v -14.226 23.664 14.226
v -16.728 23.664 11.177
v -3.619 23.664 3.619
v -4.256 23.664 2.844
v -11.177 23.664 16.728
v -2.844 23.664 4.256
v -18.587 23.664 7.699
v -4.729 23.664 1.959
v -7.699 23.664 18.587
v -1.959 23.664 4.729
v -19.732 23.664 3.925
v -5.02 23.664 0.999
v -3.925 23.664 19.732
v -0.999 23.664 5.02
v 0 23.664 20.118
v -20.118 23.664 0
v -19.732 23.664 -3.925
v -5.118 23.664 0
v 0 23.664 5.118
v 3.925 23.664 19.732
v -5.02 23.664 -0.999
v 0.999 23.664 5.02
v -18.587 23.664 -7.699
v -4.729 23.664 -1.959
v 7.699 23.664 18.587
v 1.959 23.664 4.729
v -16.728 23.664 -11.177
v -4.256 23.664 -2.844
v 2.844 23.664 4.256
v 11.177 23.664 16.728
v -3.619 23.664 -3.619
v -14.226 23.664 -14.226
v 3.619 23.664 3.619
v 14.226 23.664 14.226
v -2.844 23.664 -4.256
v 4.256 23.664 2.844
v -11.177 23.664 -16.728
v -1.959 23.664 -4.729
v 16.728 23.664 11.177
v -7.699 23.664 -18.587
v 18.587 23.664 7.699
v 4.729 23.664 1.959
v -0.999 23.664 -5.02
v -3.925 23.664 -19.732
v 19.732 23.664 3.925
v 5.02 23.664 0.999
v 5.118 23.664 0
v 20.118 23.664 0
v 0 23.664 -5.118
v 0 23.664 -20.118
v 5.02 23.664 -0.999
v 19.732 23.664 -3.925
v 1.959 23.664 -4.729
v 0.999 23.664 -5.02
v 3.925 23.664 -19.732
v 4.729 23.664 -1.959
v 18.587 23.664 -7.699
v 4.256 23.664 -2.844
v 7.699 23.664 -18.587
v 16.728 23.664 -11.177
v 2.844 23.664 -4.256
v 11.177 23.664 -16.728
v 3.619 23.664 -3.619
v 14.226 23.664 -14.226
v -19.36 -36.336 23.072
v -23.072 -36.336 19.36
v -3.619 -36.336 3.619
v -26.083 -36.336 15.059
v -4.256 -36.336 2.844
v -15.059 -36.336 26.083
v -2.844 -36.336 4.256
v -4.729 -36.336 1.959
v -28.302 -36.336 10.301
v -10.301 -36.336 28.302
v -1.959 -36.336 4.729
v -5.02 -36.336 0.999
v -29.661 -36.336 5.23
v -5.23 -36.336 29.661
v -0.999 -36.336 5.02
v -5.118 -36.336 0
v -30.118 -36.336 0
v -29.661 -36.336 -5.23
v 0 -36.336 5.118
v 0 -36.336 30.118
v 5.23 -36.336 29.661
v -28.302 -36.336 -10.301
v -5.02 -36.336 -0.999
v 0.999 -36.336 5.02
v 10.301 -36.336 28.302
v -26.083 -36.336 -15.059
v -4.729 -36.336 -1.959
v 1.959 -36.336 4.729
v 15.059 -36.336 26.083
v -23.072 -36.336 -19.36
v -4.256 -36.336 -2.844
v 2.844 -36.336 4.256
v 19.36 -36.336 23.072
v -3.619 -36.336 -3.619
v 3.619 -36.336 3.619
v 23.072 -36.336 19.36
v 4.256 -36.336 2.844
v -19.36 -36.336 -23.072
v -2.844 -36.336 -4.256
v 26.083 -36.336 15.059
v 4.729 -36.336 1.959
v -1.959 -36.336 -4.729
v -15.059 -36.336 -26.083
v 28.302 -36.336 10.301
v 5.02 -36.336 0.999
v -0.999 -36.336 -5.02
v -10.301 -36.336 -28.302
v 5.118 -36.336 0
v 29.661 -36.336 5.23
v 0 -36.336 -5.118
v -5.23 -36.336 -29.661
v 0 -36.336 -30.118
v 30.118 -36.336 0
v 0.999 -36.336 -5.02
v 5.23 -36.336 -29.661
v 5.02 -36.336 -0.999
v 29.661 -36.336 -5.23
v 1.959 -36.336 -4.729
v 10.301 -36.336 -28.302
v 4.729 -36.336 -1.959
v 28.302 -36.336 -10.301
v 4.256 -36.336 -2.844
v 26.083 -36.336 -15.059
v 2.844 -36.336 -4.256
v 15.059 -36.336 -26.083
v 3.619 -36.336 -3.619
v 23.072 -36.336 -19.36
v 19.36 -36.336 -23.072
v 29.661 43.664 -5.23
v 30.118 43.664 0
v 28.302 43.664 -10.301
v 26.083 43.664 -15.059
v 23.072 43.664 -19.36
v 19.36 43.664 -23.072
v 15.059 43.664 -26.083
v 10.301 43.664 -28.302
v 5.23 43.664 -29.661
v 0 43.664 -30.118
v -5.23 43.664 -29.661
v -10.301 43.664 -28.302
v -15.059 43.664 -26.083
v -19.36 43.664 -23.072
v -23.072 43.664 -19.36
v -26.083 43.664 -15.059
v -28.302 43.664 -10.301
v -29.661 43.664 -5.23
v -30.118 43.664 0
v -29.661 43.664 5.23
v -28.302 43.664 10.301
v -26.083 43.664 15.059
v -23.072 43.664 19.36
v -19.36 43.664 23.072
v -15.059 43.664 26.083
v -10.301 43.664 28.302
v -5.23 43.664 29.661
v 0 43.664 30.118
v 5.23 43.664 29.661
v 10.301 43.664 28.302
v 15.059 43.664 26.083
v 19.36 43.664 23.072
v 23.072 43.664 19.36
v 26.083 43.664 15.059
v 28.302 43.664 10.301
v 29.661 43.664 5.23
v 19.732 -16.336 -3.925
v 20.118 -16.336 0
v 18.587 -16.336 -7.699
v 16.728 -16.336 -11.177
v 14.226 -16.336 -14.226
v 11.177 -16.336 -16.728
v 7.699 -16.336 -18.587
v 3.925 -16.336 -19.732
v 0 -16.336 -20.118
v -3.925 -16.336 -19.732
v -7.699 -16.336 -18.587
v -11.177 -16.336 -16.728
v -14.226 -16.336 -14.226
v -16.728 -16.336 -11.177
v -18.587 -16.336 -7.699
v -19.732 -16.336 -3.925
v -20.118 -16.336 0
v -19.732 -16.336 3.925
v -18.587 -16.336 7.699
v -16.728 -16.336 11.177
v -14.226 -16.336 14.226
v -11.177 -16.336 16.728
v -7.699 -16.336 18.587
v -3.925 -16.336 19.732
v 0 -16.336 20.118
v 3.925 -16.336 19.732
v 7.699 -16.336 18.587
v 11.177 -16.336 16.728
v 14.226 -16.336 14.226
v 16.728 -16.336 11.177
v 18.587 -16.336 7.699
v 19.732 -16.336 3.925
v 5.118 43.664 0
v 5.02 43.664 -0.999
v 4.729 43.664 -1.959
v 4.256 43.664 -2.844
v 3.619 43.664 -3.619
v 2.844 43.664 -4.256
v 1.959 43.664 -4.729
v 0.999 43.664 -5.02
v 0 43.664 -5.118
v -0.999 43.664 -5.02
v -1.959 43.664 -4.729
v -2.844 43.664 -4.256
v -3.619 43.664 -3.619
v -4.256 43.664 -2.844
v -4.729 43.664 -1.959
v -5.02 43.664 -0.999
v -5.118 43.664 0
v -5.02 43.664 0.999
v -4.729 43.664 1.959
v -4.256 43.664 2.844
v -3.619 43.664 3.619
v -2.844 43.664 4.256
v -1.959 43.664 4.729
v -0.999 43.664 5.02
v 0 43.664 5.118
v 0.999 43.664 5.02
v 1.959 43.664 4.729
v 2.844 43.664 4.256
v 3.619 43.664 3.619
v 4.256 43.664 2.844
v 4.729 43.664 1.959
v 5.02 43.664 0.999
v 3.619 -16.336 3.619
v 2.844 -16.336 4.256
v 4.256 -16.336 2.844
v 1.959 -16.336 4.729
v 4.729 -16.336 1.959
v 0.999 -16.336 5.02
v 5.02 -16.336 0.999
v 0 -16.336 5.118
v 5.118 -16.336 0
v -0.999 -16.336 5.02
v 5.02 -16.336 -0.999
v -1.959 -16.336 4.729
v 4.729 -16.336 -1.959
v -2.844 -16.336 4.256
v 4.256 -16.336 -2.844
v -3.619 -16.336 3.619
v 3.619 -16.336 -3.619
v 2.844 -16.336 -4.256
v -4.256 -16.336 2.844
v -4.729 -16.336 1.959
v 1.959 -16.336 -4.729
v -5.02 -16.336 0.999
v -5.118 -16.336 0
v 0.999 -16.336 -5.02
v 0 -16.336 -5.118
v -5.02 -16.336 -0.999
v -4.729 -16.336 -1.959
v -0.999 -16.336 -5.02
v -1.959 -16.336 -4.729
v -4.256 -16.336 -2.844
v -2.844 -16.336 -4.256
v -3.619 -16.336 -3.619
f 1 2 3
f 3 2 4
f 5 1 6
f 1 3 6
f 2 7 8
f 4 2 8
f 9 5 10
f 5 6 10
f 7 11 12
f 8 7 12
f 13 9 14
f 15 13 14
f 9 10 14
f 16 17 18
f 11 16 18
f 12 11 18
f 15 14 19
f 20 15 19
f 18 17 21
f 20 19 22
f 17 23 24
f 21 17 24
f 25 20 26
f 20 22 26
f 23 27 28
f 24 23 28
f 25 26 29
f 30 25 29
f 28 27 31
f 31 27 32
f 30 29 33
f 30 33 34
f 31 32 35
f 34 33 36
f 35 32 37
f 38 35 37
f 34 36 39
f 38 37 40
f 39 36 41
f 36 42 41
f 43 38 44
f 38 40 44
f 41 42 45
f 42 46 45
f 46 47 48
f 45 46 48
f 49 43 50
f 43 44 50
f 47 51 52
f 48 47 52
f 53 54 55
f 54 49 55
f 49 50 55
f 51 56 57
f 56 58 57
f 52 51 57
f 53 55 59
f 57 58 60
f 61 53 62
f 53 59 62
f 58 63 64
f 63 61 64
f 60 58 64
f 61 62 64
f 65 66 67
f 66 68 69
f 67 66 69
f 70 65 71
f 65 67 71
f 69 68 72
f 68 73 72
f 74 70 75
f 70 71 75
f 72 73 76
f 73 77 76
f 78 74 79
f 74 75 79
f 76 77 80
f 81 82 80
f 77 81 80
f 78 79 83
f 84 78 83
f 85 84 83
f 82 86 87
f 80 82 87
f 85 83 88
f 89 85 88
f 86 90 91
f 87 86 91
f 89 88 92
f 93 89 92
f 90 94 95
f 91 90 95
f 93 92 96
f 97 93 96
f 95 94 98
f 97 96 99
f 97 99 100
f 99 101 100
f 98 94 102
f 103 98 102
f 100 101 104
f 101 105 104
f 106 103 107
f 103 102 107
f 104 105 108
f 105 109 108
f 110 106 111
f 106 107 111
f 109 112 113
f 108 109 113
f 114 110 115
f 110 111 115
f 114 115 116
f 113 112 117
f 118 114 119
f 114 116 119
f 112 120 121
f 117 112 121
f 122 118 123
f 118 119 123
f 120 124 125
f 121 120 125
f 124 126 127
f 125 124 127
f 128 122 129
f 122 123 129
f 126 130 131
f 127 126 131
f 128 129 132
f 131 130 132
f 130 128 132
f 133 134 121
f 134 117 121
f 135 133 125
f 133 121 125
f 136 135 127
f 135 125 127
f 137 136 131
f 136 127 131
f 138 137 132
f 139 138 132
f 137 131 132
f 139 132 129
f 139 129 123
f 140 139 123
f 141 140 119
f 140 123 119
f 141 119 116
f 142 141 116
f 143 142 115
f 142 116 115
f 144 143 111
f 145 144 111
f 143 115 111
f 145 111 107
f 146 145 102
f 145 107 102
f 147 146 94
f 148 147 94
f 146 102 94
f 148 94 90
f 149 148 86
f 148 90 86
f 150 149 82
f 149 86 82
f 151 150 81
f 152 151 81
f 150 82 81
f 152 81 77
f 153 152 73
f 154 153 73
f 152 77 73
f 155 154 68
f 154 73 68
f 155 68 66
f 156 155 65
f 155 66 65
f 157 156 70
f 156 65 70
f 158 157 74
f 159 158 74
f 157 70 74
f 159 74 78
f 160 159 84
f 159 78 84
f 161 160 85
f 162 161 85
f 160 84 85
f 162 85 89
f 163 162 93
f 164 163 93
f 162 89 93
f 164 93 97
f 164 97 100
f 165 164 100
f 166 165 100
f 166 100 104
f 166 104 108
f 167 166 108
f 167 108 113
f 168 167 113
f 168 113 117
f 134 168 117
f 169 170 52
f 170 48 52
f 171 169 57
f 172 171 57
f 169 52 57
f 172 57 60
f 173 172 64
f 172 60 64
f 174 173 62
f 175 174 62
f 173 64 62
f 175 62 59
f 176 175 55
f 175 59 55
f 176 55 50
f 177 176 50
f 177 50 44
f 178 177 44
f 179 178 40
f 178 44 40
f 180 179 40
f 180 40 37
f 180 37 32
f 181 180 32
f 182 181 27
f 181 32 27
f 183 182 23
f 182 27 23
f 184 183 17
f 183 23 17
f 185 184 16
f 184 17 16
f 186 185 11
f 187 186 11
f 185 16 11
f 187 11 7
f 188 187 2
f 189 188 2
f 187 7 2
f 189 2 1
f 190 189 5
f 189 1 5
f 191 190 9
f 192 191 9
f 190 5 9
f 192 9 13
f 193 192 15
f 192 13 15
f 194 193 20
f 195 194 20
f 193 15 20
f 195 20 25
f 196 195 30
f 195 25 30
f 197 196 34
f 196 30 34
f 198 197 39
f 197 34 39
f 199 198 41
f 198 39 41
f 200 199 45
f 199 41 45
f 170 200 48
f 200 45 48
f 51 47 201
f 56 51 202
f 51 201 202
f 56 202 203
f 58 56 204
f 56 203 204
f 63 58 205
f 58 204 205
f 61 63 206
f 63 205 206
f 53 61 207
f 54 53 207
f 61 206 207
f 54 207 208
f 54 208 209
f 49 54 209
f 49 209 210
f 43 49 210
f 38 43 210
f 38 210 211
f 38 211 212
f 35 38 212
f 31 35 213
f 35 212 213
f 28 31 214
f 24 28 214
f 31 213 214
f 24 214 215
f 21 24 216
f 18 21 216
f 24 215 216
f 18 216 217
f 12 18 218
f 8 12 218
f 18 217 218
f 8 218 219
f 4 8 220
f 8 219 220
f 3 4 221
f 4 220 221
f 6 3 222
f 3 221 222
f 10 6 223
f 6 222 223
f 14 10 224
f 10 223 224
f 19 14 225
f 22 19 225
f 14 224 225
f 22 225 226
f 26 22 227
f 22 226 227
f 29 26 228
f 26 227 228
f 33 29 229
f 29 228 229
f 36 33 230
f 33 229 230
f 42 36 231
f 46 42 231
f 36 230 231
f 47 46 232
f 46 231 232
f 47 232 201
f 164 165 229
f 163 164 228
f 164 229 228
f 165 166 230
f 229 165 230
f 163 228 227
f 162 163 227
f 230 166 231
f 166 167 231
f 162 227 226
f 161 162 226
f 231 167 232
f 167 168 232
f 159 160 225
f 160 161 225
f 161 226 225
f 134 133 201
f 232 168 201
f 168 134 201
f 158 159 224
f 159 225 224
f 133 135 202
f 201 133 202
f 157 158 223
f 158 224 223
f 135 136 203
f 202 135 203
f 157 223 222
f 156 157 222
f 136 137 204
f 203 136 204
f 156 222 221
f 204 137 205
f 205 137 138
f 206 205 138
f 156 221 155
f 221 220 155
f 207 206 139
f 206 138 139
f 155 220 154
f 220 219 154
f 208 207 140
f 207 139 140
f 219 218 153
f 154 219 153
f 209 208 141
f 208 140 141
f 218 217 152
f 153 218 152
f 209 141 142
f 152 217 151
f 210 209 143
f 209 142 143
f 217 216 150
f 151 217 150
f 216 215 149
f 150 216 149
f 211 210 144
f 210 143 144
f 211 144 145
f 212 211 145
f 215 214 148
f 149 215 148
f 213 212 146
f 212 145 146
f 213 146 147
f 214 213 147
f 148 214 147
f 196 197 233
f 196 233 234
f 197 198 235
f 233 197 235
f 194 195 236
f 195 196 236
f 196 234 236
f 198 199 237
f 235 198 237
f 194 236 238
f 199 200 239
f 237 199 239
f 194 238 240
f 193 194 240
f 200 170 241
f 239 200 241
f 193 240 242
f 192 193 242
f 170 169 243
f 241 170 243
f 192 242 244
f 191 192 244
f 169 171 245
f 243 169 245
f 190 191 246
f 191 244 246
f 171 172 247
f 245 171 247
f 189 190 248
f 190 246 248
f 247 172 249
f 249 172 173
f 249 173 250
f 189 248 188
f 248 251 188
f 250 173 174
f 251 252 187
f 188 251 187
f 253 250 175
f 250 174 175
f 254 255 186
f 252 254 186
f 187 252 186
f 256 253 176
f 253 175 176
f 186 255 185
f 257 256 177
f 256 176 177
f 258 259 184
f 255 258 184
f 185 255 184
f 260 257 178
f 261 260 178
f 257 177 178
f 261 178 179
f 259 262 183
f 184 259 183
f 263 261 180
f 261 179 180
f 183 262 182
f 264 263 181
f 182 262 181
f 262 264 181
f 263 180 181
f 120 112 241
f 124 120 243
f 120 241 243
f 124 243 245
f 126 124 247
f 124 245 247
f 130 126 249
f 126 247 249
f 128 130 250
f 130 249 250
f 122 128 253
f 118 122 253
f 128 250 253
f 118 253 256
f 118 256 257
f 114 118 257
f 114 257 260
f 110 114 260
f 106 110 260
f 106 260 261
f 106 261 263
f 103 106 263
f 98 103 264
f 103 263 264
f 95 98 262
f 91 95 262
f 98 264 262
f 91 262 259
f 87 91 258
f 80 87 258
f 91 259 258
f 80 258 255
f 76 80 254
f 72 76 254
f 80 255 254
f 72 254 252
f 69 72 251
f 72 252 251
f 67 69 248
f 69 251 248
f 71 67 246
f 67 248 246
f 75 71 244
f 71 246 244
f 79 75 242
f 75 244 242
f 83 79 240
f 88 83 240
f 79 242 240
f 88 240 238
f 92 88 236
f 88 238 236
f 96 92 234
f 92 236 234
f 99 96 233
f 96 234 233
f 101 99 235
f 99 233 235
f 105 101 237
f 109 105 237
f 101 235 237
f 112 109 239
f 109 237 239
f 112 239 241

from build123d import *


with BuildPart() as part:
    # Croquis6 → Revolución2 (revolve)
    with BuildSketch(Plane.XY):
        Polygon((5.118334973, 43.663840535), (30.118334973, 43.663840535), (30.118334973, -36.336159465), (5.118334973, -36.336159465), (5.118334973, -16.336159465), (20.118334973, -16.336159465), (20.118334973, 23.663840535), (5.118334973, 23.663840535), align=None)
    revolve(axis=Axis((0, 0, 0), (0, 1, 0)))


solid = part.part
